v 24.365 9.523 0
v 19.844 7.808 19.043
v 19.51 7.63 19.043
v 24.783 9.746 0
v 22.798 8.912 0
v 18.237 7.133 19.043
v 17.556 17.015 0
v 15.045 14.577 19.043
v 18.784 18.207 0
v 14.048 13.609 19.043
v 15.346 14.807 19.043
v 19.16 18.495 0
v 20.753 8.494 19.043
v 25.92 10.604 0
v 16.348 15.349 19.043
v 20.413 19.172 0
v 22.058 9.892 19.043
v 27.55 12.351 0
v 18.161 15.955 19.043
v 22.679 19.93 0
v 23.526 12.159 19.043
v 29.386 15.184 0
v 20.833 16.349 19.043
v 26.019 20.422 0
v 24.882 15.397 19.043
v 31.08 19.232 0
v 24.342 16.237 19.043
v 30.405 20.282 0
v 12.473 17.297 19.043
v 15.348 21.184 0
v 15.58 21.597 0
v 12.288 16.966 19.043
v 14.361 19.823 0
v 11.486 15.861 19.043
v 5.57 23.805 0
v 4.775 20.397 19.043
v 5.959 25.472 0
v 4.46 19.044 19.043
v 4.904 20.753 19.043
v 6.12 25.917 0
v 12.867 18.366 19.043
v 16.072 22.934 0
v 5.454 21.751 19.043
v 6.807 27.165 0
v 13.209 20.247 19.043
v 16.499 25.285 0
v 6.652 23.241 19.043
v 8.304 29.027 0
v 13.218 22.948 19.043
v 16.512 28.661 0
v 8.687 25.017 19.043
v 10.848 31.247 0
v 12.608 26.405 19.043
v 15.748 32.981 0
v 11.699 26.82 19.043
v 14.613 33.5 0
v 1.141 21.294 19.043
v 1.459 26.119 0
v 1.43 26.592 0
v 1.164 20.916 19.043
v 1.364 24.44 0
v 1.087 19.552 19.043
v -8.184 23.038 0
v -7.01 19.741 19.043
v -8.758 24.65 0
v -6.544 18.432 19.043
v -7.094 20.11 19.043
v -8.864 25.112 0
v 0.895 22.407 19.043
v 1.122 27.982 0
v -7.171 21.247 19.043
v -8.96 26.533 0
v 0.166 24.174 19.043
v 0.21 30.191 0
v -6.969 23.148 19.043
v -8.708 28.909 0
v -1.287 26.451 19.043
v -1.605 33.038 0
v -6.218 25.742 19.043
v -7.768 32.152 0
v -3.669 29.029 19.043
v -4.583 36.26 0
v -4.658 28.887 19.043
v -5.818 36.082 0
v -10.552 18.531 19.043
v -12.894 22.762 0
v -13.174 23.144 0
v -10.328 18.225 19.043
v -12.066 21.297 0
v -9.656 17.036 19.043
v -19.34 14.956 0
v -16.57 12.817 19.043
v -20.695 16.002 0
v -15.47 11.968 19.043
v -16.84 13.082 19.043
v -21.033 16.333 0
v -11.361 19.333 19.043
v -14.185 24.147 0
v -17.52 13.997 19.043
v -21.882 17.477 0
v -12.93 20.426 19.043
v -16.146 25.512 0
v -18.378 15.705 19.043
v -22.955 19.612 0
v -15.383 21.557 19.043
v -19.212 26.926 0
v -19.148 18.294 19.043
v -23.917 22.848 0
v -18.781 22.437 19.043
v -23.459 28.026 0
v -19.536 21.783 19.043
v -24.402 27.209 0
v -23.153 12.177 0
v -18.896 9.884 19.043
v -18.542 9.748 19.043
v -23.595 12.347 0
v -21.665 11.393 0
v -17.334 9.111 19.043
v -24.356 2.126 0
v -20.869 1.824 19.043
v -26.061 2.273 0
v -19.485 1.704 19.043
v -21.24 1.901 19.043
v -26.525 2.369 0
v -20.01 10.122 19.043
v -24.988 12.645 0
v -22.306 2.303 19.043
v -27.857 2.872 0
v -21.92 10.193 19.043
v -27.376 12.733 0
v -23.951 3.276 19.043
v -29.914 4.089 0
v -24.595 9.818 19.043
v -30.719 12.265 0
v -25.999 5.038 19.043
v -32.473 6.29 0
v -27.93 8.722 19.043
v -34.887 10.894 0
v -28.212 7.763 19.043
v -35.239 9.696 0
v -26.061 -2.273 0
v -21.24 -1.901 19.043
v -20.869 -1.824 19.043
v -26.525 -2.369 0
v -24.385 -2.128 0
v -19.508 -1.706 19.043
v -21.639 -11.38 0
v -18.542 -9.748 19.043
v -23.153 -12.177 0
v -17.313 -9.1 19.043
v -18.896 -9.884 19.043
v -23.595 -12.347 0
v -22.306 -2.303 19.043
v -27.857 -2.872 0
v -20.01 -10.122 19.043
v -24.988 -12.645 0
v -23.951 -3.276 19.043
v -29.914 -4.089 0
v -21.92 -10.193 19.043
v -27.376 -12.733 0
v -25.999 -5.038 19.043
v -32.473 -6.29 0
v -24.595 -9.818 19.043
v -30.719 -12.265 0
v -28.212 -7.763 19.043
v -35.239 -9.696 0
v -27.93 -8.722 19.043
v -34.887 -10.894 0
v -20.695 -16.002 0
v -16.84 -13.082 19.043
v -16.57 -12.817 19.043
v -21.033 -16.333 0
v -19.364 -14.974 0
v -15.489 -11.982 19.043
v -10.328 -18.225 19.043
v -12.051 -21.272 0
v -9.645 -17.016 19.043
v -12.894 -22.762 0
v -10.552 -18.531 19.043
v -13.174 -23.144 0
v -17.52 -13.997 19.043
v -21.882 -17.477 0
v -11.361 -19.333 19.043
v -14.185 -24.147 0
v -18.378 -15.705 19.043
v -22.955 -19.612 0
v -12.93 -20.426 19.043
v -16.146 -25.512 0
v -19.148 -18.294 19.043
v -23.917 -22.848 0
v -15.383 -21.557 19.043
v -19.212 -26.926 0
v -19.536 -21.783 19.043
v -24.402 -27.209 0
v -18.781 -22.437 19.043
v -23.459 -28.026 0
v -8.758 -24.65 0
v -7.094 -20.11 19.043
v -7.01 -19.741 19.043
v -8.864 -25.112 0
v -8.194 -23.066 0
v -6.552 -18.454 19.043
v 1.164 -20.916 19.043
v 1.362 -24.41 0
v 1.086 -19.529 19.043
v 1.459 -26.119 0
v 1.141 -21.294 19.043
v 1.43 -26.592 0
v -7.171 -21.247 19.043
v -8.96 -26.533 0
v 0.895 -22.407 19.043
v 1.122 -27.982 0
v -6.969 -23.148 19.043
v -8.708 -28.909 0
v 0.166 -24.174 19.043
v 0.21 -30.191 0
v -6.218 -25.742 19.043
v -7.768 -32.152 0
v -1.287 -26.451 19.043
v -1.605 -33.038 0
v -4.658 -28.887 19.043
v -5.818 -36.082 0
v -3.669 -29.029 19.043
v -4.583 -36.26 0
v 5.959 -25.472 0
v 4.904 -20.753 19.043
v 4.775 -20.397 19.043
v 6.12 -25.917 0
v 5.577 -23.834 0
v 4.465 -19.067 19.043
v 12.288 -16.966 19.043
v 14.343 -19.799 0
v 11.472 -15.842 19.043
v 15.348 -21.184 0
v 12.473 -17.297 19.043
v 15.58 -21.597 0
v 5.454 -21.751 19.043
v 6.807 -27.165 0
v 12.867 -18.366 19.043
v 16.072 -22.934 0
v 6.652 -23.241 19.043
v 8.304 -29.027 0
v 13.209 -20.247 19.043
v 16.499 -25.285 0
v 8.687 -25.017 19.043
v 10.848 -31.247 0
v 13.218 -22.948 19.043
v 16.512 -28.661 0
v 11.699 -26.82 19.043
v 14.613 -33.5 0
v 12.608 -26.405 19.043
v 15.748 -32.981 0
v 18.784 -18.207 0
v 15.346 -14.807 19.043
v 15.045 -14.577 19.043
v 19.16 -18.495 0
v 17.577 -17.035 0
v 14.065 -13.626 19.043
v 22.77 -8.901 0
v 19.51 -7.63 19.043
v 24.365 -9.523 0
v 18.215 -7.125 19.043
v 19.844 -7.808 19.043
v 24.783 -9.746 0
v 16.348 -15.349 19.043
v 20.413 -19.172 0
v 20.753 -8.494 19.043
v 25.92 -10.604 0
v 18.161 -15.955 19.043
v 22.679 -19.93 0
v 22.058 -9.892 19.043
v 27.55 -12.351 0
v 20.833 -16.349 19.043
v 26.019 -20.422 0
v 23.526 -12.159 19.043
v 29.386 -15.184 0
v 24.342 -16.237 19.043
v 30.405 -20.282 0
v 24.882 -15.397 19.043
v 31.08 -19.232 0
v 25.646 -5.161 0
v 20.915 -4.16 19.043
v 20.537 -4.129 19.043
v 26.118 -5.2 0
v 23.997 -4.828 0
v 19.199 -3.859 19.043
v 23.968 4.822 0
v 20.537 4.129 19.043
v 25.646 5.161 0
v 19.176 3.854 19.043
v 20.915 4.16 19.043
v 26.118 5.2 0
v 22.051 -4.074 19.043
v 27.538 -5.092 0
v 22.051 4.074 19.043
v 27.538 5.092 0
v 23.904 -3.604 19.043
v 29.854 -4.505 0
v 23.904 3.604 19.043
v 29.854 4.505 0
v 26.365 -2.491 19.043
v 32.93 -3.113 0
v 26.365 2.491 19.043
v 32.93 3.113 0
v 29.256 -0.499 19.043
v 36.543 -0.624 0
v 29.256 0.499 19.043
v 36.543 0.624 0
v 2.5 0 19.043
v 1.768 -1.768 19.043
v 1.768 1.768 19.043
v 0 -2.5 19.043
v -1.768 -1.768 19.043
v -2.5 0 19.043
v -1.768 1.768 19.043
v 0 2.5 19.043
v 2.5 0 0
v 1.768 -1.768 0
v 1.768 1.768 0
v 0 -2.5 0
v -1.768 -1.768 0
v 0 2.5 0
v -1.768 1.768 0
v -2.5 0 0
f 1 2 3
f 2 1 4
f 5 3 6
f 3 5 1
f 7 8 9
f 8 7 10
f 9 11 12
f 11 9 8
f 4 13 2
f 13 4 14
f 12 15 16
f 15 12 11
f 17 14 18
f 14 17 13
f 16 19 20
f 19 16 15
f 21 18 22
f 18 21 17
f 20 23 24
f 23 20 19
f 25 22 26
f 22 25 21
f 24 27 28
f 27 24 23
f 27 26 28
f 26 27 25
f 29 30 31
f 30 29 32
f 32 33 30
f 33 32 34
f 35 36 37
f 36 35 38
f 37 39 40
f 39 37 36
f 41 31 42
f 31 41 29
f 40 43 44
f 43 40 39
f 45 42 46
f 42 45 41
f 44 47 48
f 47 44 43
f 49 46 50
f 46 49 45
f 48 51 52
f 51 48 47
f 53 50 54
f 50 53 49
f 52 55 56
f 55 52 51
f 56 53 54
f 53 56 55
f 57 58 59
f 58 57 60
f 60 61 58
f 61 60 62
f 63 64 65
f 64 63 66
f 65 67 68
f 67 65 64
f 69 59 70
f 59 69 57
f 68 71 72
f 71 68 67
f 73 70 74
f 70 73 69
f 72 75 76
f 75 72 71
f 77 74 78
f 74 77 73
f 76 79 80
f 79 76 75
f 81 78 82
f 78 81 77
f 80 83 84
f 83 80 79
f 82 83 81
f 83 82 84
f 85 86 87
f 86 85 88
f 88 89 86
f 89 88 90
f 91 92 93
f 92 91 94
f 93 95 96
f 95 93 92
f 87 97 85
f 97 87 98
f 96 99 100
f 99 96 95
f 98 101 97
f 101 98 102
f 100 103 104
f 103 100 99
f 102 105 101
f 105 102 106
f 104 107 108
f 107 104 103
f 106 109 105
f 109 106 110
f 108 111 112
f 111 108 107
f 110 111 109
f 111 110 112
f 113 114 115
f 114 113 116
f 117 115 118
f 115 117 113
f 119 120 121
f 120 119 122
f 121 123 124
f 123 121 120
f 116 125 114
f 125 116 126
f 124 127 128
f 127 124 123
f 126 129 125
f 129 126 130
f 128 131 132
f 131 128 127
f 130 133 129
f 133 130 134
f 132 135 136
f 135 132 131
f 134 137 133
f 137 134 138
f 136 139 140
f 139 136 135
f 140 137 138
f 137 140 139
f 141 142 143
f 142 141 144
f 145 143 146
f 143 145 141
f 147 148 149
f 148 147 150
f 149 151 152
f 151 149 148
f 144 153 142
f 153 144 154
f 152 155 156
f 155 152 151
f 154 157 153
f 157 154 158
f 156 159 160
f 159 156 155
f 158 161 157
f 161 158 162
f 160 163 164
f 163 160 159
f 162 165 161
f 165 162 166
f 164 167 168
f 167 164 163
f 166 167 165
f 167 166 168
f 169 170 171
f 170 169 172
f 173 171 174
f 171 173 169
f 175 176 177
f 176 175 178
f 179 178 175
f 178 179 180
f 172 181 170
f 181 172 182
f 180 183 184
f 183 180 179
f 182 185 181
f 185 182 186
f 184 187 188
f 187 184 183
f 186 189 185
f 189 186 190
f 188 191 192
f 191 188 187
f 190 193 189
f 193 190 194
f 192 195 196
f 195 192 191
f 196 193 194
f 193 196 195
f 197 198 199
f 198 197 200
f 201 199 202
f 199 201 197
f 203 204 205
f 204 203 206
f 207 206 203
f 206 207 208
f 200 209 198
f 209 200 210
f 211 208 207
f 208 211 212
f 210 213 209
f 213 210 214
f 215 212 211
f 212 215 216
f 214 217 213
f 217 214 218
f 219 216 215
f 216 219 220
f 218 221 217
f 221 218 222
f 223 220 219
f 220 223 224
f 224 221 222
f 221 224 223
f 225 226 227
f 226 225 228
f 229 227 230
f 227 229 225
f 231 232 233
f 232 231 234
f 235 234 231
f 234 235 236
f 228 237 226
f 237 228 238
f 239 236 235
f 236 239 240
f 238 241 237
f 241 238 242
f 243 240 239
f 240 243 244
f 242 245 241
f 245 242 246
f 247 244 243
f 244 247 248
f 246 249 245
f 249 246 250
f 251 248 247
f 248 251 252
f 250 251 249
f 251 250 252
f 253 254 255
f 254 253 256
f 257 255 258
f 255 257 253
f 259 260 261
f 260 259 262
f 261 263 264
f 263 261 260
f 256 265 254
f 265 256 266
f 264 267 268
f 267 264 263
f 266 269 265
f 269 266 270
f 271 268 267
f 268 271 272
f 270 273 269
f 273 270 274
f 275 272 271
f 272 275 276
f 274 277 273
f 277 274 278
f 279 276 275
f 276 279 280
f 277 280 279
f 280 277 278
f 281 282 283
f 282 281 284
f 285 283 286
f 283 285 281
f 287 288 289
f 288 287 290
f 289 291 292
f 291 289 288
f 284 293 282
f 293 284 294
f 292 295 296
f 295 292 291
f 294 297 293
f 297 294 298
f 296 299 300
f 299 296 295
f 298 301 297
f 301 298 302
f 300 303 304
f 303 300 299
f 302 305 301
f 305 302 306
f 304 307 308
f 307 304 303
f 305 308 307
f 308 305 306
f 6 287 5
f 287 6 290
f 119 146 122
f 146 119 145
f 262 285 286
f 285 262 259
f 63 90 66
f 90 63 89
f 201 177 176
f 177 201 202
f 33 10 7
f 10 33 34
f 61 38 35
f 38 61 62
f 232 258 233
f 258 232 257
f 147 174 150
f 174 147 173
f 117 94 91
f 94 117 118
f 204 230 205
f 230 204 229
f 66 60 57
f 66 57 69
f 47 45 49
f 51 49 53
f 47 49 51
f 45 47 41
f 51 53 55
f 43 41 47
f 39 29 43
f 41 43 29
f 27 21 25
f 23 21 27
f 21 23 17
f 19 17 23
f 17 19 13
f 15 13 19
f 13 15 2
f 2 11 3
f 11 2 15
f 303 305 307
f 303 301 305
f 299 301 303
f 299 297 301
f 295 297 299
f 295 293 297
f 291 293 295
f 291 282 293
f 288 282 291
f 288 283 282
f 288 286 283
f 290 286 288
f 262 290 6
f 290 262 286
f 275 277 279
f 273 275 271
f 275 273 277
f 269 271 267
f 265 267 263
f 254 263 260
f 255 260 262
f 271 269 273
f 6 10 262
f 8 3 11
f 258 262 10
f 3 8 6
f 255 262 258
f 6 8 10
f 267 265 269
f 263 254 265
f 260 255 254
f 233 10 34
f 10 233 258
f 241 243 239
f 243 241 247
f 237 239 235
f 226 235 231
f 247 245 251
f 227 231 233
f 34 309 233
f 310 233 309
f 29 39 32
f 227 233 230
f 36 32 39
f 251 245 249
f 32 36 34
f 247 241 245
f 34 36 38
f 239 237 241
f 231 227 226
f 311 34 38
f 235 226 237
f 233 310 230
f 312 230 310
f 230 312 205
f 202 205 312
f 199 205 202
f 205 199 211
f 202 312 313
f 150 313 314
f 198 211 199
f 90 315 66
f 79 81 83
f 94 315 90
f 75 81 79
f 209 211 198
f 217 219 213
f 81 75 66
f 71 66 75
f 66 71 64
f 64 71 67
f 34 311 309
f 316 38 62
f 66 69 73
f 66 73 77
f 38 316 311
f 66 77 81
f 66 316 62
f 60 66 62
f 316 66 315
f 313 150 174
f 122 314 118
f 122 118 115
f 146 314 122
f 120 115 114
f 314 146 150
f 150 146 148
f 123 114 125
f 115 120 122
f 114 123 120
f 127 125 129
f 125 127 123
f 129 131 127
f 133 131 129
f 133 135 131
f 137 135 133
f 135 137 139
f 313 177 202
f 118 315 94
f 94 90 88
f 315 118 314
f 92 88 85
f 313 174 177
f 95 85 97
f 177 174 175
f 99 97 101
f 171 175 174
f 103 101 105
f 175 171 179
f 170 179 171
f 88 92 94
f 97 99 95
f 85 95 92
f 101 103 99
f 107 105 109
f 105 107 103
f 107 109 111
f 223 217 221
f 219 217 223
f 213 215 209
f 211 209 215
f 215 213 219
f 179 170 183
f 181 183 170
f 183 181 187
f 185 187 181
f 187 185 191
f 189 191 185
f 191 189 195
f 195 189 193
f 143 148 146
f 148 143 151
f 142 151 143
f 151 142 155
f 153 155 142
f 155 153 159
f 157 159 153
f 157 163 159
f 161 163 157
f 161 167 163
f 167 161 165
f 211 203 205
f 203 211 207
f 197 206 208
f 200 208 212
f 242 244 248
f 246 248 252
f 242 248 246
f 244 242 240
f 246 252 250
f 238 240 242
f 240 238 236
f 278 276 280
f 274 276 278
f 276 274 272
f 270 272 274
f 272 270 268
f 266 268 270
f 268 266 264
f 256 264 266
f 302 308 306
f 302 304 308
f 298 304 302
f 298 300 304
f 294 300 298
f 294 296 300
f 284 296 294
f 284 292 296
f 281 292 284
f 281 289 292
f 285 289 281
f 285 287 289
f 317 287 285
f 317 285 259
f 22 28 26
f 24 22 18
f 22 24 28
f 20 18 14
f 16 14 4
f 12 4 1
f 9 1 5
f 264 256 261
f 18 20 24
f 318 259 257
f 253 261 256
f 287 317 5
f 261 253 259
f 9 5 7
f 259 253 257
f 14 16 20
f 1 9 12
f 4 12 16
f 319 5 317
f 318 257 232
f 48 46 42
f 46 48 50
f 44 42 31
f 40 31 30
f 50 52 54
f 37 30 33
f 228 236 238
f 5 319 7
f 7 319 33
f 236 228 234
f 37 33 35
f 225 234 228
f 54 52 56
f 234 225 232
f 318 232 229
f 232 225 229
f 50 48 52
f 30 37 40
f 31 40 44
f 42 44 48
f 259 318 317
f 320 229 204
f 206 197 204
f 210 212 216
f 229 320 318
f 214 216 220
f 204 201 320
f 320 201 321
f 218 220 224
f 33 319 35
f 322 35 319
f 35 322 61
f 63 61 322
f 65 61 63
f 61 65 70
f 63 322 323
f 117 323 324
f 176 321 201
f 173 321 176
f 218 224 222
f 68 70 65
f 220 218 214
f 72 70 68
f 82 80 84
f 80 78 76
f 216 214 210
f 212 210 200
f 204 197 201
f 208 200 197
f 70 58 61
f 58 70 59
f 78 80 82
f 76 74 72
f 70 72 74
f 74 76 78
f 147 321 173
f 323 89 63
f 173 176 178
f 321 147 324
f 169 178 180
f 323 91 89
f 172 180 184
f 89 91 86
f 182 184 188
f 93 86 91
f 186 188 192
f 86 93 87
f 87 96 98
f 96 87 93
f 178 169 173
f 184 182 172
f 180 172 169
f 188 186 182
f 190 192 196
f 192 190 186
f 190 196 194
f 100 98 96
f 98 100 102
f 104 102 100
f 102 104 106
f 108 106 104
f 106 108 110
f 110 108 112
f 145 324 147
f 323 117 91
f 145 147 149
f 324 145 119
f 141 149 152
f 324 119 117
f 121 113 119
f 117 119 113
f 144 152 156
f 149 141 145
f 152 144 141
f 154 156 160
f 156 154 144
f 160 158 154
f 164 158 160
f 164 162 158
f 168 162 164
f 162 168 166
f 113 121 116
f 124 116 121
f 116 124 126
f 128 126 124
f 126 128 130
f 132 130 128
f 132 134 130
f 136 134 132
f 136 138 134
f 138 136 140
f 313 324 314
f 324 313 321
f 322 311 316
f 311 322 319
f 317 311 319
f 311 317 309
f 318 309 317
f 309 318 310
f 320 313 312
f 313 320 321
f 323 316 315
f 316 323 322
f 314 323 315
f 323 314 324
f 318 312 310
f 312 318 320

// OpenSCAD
use <MCAD/involute_gears.scad>

00_build_plate = 0; //[0:Replicator 2,1:Replicator,3:Thing-o-Matic]

01_number_of_teeth = 11;

//the distance from the pitch apex to the outside pitch diameter
02_cone_distance = 100;

//the length of the teeth
03_face_width = 20;

//controls the size of the teeth (and hence the size of the gear). The circular pitch at the outside pitch diameter.
04_outside_circular_pitch =  1000;

//controls the shape of the teeth
05_pressure_angle = 30;

//gap between the tip of the teeth on one gear and the root of the teeth on another meshing gear
06_clearance = .2;

//size of the hole in the middle
07_bore_diameter = 5;

//the thickness of the gear for bevel_gear_back_cone finish (see below)
08_gear_thickness = 15;

//makes the tooth width smaller to make a gap between teeth of correctly spaced gears to allow for manufacturing tolerances
09_backlash = 0;

//the number of facets in one side of the involute tooth shape
10_involute_facets = 0;

11_finish = 0; //[0:Flat,1:Back Cone]


bevel_gear(	number_of_teeth = 01_number_of_teeth,
		cone_distance = 02_cone_distance,
		face_width = 03_face_width,
		outside_circular_pitch =  04_outside_circular_pitch,
		pressure_angle = 05_pressure_angle,
		clearance = 06_clearance,
		bore_diameter = 07_bore_diameter,
		gear_thickness = 08_gear_thickness,
		backlash = 09_backlash,
		involute_facets = 10_involute_facets,
		finish = 11_finish
);

translate([0,0,-.5]){
	if(00_build_plate == 0){
		%cube([285,153,1],center = true);
	}
	if(00_build_plate == 1){
		%cube([225,145,1],center = true);
	}
	if(00_build_plate == 3){
		%cube([120,120,1],center = true);
	}

}
